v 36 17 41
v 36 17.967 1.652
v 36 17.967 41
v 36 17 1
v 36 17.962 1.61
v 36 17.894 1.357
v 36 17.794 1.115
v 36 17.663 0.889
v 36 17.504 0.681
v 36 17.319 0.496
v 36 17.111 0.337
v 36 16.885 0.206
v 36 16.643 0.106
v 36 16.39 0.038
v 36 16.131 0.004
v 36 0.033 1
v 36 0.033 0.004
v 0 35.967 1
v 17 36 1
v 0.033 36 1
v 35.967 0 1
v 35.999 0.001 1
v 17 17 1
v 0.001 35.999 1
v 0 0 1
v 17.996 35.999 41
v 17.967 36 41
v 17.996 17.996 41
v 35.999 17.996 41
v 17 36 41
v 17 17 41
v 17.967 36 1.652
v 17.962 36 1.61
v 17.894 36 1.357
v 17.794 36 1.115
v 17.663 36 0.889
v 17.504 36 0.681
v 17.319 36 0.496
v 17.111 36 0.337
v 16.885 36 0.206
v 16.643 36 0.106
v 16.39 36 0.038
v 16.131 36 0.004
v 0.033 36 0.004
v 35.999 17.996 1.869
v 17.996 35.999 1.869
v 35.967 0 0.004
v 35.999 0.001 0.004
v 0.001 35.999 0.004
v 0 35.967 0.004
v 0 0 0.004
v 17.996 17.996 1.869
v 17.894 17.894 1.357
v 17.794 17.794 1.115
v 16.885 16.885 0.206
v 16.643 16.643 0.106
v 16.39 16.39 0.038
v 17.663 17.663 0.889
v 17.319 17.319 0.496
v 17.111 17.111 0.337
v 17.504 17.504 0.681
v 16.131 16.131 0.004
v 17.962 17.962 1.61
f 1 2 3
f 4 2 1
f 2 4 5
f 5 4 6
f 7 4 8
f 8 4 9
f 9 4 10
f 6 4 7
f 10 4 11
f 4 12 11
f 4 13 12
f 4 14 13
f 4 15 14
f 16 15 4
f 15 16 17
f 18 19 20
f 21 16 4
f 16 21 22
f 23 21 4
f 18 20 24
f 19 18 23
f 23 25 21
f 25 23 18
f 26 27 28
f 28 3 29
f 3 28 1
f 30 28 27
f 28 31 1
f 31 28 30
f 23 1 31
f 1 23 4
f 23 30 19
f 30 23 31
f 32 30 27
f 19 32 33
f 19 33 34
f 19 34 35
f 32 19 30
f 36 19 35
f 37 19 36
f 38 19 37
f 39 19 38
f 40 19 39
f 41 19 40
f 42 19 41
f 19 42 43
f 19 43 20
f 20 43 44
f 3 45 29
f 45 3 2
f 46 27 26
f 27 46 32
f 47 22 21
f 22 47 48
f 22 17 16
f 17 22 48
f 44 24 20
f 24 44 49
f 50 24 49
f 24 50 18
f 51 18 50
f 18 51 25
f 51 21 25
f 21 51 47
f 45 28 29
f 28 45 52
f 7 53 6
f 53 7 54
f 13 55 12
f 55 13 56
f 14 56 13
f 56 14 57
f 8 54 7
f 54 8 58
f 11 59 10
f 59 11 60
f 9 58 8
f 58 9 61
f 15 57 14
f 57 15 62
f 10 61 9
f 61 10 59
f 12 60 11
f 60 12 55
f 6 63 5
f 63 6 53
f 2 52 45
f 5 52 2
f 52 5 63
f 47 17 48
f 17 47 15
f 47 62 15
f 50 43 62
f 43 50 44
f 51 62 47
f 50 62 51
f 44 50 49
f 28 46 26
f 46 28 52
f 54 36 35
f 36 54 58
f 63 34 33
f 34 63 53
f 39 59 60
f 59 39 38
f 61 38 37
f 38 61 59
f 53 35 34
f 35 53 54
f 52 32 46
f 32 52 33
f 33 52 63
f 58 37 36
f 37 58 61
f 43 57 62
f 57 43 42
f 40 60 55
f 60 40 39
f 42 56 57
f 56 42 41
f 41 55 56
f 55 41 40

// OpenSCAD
/*
    Surface-mounted INNER 90° corner
    Cable channel 40x16 mm

    Two outer horizontal R2 edges
    with a common smooth blend.

    Central vertical edge is straight.
    Rear corner (0,0) is straight.
*/

$fn = 96;

arm = 36;
depth = 18;
height = 40;
wall = 1;
corner_radius = 2;
print_mode = true;

H = height + wall;
eps = 0.02;


// L-shaped cover
module rounded_L() {
    r = corner_radius;

    union() {
        offset(delta = -r)
            offset(r = r)
                polygon([
                    [0,0],
                    [arm,0],
                    [arm,depth],
                    [depth,depth],
                    [depth,arm],
                    [0,arm]
                ]);

        // Straight rear corner
        difference() {
            square([r,r]);

            translate([r,r])
                circle(r=r);
        }
    }
}


// Cover footprint mask
module footprint_mask() {
    translate([0,0,-eps])
        linear_extrude(height=H+2*eps)
            rounded_L();
}


// Base construction made of three walls
module base_corner() {
    union() {
        // Cover
        translate([0,0,height])
            linear_extrude(height=wall)
                rounded_L();

        // Vertical walls
        intersection() {
            footprint_mask();

            union() {
                translate([depth,depth-wall,0])
                    cube([
                        arm-depth,
                        wall,
                        height
                    ]);

                translate([depth-wall,depth,0])
                    cube([
                        wall,
                        arm-depth,
                        height
                    ]);

                // Central joint
                translate([
                    depth-wall,
                    depth-wall,
                    0
                ])
                    cube([
                        wall,
                        wall,
                        height
                    ]);
            }
        }
    }
}


// Auxiliary extended outline.
// Its far edges do not intersect
// the actual part.
module extended_L() {
    e = 12;

    polygon([
        [-e,-e],
        [arm+e,-e],
        [arm+e,depth],
        [depth,depth],
        [depth,arm+e],
        [-e,arm+e]
    ]);
}


// Single 3D rounding mask.
//
// Rounds both outer horizontal edges
// at once and forms a consistent
// blend at their junction.
module rounded_outer_mask() {
    r = corner_radius;

    minkowski() {
        translate([0,0,-10])
            linear_extrude(height=H-r+10)
                offset(delta=-r)
                    extended_L();

        sphere(r=r, $fn=48);
    }
}


// Final model
module internal_corner() {
    intersection() {
        base_corner();
        rounded_outer_mask();
    }
}


// Orientation for printing
if (print_mode) {
    translate([0,0,H])
        mirror([0,0,1])
            internal_corner();
} else {
    internal_corner();
}
